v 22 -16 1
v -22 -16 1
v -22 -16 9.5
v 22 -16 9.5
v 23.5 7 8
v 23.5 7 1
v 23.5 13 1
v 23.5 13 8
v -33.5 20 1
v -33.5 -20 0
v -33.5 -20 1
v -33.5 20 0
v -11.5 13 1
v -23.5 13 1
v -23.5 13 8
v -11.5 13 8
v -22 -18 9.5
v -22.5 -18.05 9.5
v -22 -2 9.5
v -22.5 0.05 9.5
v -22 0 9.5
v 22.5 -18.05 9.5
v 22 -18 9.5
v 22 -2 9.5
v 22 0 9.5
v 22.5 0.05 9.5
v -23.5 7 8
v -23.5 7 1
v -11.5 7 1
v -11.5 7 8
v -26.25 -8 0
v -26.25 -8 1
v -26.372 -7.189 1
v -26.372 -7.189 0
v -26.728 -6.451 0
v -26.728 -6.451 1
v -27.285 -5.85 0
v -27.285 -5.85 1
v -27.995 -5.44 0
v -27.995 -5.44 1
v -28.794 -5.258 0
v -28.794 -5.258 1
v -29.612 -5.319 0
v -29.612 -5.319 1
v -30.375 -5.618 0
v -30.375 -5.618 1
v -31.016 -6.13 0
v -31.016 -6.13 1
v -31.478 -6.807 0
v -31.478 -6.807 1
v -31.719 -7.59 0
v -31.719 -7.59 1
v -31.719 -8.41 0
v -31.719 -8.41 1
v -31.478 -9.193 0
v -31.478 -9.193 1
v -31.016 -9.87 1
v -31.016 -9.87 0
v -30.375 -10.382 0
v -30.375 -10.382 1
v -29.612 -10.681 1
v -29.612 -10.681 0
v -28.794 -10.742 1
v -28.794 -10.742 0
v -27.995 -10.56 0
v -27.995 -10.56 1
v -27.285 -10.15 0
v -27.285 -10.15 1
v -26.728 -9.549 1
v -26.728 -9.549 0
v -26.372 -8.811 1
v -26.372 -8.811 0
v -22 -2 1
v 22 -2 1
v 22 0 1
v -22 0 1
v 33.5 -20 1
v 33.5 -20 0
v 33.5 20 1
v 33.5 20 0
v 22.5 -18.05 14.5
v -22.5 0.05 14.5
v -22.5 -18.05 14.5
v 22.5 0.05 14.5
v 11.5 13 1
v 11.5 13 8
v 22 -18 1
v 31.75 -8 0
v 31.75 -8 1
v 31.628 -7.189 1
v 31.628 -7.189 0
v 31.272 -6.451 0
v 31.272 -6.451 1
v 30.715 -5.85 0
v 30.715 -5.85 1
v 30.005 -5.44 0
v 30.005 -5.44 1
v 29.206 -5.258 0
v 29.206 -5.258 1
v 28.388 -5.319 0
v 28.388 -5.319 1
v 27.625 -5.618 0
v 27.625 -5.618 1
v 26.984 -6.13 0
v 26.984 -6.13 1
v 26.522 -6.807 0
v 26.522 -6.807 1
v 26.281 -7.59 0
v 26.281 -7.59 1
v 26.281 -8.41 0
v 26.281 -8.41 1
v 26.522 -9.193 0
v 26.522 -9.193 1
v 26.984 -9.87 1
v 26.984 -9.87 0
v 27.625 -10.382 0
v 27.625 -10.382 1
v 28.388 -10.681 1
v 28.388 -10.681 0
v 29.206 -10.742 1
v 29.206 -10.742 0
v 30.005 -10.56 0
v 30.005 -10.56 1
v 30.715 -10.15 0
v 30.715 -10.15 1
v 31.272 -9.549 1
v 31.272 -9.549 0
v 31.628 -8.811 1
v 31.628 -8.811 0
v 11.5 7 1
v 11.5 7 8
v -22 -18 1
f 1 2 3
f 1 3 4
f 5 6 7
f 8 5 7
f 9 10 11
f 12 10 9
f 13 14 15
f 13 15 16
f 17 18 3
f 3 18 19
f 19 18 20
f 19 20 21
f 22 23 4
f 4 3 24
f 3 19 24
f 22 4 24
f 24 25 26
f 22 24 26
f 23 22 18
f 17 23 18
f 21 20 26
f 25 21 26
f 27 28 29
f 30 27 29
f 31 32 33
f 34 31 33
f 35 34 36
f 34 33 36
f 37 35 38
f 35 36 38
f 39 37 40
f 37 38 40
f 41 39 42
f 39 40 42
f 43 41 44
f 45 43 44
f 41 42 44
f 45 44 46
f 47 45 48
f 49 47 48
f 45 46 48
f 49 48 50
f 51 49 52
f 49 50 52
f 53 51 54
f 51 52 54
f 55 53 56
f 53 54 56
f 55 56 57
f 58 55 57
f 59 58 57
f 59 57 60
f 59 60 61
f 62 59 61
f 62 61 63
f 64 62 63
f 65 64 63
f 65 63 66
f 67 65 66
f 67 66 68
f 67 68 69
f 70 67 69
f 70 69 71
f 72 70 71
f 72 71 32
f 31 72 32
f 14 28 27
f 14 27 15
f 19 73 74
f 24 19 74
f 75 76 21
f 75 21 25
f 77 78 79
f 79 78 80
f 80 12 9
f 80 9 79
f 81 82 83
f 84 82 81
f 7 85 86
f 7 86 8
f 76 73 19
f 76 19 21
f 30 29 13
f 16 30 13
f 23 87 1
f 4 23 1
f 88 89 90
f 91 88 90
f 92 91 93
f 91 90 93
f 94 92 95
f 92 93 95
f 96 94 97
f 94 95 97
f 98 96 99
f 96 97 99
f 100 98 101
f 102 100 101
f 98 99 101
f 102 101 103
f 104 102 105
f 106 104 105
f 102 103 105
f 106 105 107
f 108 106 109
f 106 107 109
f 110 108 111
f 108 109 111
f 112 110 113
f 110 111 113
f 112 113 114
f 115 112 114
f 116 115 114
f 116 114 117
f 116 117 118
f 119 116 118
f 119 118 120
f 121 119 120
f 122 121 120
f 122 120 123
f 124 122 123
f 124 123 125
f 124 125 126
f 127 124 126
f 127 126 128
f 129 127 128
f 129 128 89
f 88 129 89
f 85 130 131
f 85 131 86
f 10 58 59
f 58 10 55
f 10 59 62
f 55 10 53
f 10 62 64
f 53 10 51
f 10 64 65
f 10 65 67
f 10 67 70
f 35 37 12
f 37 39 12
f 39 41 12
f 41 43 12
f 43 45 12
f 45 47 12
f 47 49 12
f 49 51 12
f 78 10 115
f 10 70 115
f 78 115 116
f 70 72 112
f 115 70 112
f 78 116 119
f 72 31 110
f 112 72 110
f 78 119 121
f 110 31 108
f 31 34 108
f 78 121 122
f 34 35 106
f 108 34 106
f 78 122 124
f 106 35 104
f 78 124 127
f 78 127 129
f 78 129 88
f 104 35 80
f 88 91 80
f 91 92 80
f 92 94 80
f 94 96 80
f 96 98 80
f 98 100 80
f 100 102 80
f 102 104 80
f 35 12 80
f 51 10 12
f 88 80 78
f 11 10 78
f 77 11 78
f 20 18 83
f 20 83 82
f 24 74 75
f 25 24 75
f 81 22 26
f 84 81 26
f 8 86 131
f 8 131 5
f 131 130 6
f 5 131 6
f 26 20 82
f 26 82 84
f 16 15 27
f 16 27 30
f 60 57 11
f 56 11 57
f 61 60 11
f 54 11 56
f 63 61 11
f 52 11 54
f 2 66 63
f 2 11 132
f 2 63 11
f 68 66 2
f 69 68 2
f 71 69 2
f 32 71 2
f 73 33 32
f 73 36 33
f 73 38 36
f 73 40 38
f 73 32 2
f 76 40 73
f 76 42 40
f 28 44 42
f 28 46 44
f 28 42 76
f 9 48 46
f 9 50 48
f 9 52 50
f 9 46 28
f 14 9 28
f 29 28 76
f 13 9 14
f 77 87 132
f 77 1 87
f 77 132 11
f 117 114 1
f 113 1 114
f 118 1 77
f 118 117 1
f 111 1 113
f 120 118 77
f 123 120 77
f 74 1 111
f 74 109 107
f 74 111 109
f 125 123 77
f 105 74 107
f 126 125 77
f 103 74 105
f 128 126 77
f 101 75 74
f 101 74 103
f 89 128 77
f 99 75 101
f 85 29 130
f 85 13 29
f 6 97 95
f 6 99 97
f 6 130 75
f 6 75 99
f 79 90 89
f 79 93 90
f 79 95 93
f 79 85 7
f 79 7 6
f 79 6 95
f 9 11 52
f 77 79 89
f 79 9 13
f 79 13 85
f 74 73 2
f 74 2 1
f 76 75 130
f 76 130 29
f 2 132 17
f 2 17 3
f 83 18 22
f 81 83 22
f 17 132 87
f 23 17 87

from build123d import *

# Parameters (mm, degrees)
SKETCH_1_W          = 67
SKETCH_1_H          = 40
EXTRUDE_1_DEPTH     = 1
SKETCH_2_W          = 44
SKETCH_2_H          = 2
EXTRUDE_2_DEPTH     = 8.5
SKETCH_3_W          = 45
SKETCH_3_H          = 18.1
EXTRUDE_3_DEPTH     = 5
SKETCH_4_R          = 2.75
CUT_EXTRUDE_1_DEPTH = 5
SKETCH_5_W          = 12
SKETCH_5_H          = 6
EXTRUDE_4_DEPTH     = 7


with BuildPart() as part:
    # ｽｹｯﾁ1 → ﾎﾞｽ - 押し出し1 (new body)
    with BuildSketch(Plane.XY):
        Rectangle(SKETCH_1_W, SKETCH_1_H)
    extrude(amount=EXTRUDE_1_DEPTH)

    # ｽｹｯﾁ2 → ﾎﾞｽ - 押し出し2 (add)
    with BuildSketch(Plane.XY.offset(1)):
        with Locations((0, -1)):
            Rectangle(SKETCH_2_W, SKETCH_2_H)
        with Locations((0, -17)):
            Rectangle(SKETCH_2_W, SKETCH_2_H)
    extrude(amount=EXTRUDE_2_DEPTH)

    # ｽｹｯﾁ3 → ﾎﾞｽ - 押し出し3 (add)
    with BuildSketch(Plane.XY.offset(9.5)):
        with Locations((0, -9)):
            Rectangle(SKETCH_3_W, SKETCH_3_H)
    extrude(amount=EXTRUDE_3_DEPTH)

    # ｽｹｯﾁ4 → ｶｯﾄ - 押し出し1 (cut)
    with BuildSketch(Plane.XY.offset(1)):
        with Locations((-29, -8)):
            Circle(SKETCH_4_R)
        with Locations((29, -8)):
            Circle(SKETCH_4_R)
    extrude(amount=-CUT_EXTRUDE_1_DEPTH, mode=Mode.SUBTRACT)

    # ｽｹｯﾁ5 → ﾎﾞｽ - 押し出し4 (add)
    with BuildSketch(Plane.XY.offset(1)):
        with Locations((-17.5, 10)):
            Rectangle(SKETCH_5_W, SKETCH_5_H)
        with Locations((17.5, 10)):
            Rectangle(SKETCH_5_W, SKETCH_5_H)
    extrude(amount=EXTRUDE_4_DEPTH)


solid = part.part
